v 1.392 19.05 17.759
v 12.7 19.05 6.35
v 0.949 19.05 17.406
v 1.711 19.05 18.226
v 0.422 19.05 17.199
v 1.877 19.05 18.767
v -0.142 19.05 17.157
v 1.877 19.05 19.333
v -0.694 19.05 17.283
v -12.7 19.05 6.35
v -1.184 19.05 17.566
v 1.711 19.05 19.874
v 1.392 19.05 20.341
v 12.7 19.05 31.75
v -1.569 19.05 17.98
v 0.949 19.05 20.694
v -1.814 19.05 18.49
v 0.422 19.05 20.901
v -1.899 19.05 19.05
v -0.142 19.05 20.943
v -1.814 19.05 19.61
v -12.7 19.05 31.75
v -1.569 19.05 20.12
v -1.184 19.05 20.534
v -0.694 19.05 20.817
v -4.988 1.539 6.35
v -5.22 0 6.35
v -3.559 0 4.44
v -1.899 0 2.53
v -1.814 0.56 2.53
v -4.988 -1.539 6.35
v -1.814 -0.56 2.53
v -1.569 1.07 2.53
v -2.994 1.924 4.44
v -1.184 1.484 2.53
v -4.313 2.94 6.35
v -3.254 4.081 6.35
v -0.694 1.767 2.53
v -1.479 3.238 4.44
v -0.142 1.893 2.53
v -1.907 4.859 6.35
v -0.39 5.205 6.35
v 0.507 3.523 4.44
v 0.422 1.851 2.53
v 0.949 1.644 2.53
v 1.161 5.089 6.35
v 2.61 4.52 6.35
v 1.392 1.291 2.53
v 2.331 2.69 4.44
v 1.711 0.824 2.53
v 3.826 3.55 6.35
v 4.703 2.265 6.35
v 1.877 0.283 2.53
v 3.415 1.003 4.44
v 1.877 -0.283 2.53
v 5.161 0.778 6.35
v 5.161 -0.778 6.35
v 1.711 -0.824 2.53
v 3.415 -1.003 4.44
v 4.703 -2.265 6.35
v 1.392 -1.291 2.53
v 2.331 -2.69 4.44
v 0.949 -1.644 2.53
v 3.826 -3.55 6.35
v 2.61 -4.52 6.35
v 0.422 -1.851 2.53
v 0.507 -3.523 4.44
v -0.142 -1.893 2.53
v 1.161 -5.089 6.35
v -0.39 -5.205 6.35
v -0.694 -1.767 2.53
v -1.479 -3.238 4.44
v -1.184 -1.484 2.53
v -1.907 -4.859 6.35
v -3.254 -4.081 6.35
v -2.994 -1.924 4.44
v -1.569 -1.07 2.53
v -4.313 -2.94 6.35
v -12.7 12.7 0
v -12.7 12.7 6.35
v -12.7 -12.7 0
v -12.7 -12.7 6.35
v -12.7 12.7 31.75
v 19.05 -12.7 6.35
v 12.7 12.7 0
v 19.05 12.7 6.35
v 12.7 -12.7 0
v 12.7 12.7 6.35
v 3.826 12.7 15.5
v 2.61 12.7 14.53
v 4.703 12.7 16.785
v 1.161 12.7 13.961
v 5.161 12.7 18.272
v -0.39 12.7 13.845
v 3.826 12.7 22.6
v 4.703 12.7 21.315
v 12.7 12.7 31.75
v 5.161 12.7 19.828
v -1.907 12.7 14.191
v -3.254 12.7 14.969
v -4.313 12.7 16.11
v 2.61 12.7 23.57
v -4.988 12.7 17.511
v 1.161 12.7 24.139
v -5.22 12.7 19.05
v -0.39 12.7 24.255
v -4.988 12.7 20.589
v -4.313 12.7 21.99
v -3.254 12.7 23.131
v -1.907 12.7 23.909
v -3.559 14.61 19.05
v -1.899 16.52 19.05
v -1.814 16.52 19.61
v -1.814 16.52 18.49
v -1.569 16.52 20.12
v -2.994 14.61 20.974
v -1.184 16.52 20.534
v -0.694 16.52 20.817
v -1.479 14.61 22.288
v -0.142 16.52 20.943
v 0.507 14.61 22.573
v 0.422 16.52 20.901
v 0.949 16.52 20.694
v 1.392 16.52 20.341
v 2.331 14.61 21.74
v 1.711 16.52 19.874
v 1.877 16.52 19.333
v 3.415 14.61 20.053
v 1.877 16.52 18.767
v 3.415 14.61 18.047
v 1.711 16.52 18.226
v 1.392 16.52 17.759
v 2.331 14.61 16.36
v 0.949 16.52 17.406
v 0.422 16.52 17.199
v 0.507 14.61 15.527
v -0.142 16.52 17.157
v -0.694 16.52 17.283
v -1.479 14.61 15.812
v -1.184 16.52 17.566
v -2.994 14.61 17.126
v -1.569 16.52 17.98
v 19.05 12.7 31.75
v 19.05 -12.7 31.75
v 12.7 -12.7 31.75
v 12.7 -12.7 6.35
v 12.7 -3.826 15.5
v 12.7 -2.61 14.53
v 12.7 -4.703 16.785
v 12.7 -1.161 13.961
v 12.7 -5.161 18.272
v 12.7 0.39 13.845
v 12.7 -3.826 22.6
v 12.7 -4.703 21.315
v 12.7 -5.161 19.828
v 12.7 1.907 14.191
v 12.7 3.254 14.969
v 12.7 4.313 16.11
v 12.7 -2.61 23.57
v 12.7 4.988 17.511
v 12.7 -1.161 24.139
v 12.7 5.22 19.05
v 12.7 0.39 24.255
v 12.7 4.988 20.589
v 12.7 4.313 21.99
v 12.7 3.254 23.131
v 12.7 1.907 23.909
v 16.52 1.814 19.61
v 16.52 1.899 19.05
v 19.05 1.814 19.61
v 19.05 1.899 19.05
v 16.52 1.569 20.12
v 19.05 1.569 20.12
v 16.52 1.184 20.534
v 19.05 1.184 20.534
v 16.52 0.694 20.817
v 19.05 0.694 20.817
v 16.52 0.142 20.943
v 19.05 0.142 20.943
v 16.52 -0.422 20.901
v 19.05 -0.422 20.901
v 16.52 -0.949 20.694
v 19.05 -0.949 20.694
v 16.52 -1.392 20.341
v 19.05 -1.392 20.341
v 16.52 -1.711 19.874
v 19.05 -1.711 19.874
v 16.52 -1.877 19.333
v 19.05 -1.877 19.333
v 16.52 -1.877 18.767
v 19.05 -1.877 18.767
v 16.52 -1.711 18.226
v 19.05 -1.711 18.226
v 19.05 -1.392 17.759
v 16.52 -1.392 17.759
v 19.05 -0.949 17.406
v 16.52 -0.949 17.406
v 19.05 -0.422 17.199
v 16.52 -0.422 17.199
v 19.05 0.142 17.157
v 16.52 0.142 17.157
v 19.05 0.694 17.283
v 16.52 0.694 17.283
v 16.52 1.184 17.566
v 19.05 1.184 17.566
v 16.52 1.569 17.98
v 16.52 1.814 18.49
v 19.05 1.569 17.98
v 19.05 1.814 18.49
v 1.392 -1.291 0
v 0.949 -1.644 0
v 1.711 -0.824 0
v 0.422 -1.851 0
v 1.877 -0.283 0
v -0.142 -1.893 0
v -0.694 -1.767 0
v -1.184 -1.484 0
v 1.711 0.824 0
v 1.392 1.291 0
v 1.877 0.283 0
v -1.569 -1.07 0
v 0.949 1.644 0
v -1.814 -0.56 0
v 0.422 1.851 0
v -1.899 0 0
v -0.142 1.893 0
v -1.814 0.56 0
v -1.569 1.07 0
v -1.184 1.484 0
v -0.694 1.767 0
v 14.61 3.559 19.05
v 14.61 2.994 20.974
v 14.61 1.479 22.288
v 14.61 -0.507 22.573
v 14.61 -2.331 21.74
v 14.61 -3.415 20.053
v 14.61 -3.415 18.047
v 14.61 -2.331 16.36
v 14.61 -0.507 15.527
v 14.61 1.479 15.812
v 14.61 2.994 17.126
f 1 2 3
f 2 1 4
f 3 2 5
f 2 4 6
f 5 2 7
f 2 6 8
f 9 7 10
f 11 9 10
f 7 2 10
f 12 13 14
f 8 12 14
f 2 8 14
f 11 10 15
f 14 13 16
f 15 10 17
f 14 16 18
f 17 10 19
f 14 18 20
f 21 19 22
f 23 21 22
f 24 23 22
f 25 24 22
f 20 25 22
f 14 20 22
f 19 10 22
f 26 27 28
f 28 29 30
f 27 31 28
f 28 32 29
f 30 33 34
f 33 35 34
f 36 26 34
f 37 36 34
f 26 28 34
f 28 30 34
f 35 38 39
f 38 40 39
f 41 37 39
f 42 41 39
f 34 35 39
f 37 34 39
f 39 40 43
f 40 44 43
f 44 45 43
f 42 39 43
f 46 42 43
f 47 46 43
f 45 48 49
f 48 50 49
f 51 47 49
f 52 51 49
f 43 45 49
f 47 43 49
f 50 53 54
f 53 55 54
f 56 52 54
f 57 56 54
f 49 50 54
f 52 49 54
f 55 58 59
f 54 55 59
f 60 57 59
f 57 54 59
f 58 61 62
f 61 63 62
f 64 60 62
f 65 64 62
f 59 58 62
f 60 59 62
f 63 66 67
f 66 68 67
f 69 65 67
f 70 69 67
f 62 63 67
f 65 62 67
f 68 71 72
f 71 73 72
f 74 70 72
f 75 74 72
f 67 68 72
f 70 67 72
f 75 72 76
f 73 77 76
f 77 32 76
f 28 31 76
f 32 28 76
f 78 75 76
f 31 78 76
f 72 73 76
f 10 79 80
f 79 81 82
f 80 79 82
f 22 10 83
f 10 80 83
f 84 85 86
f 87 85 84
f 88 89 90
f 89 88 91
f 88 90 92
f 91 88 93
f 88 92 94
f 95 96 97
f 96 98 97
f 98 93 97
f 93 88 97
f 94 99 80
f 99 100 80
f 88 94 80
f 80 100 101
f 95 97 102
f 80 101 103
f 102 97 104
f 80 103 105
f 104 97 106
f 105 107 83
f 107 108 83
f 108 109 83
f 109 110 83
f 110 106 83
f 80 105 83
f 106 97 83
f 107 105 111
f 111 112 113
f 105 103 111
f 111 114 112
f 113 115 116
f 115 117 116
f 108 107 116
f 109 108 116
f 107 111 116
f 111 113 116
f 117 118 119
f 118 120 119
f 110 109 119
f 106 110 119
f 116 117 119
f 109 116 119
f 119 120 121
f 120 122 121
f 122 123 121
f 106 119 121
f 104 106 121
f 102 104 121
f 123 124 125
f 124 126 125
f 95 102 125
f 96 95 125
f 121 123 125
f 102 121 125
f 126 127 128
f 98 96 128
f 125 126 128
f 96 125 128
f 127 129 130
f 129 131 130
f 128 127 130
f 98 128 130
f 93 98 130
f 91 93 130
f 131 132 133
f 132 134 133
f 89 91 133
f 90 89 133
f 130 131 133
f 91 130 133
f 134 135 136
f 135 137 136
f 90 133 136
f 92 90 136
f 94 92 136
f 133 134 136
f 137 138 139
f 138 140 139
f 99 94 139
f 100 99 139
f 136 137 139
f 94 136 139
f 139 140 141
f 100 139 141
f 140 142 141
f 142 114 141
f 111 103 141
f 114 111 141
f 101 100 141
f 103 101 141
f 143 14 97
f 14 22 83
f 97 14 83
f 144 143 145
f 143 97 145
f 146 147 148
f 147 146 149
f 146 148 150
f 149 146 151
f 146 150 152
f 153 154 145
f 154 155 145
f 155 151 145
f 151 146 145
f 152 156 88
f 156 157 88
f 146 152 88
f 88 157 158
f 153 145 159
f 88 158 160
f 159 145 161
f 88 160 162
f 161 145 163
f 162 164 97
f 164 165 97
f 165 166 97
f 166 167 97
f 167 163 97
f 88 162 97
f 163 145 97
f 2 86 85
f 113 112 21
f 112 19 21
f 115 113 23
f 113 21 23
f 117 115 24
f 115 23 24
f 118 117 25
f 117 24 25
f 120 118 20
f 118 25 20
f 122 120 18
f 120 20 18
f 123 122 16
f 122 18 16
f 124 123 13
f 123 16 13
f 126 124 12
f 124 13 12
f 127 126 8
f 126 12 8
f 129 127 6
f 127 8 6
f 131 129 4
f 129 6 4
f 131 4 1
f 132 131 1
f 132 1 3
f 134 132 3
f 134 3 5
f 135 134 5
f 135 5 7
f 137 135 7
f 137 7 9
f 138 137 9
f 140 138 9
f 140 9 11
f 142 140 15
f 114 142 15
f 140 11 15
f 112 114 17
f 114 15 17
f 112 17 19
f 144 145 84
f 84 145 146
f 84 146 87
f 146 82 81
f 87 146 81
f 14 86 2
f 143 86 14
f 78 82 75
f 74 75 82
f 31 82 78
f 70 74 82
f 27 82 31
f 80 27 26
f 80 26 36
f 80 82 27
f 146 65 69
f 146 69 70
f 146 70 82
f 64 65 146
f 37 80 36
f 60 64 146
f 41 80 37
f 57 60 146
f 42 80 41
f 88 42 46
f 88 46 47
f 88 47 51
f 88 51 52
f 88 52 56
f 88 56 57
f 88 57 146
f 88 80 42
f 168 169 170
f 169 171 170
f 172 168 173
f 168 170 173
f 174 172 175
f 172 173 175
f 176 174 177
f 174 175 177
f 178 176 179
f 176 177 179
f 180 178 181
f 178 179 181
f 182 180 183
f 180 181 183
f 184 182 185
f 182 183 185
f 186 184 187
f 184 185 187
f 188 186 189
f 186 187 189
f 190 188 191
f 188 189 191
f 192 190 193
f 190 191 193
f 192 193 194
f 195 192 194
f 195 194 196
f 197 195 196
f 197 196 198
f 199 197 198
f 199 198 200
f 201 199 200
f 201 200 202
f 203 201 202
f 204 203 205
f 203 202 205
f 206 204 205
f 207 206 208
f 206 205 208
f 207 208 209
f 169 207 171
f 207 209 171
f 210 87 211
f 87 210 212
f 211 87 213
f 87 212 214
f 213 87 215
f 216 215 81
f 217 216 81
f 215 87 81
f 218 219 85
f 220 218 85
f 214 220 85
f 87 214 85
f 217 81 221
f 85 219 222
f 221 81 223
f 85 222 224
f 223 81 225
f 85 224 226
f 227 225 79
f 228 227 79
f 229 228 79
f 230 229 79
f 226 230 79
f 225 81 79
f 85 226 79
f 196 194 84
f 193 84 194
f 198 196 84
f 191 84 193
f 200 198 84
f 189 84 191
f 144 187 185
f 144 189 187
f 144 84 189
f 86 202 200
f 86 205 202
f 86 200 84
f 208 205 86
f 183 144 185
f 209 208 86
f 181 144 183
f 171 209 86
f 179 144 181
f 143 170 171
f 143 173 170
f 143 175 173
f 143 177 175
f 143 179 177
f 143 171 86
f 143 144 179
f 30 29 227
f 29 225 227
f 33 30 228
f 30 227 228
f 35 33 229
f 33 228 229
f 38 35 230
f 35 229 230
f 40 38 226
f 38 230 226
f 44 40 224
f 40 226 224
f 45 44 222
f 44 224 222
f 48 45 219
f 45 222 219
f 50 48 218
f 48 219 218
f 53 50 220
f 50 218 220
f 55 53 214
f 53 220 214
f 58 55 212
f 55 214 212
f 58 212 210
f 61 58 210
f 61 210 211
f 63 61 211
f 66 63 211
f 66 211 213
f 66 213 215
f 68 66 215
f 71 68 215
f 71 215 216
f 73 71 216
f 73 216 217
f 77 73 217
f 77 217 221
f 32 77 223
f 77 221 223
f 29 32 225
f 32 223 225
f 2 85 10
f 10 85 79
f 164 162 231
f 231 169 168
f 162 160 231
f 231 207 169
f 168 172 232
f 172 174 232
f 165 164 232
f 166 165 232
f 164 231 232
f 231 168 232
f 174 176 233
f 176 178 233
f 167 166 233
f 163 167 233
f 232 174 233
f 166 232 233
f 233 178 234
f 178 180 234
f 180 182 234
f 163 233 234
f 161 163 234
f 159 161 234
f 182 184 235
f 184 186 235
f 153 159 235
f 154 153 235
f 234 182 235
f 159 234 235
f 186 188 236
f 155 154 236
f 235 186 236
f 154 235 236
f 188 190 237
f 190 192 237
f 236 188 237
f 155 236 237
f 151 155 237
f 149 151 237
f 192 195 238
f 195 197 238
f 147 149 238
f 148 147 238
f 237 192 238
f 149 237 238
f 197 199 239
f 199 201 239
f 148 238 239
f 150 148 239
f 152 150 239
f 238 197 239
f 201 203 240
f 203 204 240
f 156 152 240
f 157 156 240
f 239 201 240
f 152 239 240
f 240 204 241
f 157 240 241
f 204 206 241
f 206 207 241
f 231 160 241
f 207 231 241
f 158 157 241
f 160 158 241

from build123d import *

# Parameters (mm, degrees)
F0_W                 = 25.4
F0_H                 = 25.4
F1_DEPTH             = 6.35
F2_W                 = 25.4
F2_H                 = 6.35
F3_DEPTH             = 6.35
F4_W                 = 25.4
F4_H                 = 6.35
F5_DEPTH             = 6.35
F9_D                 = 3.7973
F9_CSINK_D           = 10.4394
F9_CSINK_ANGLE       = 82
F9_ON_F6_D           = 3.7973
F9_ON_F6_CSINK_D     = 10.4394
F9_ON_F6_CSINK_ANGLE = 82
F9_ON_F8_D           = 3.7973
F9_ON_F8_CSINK_D     = 10.4394
F9_ON_F8_CSINK_ANGLE = 82
F10_SIZE             = 6.35


with BuildPart() as f1:
    # F0 (on Top) → F1 (new body)
    with BuildSketch(Plane.XY):
        Rectangle(F0_W, F0_H)
    extrude(amount=F1_DEPTH)

    # F2 (on face) → F3 (join)
    with BuildSketch(Plane.YZ.offset(12.7)):
        Polygon((12.7, 6.35), (12.7, 0), (19.05, 0), (19.05, 31.75), (-12.7, 31.75), (-12.7, 6.35), align=None)
        with Locations((0, 3.175)):
            Rectangle(F2_W, F2_H)
    extrude(amount=F3_DEPTH)

    # F4 (on face) → F5 (join)
    with BuildSketch(Plane(origin=(0, 12.7, 0), x_dir=(-1, 0, 0), z_dir=(0, 1, 0))):
        Polygon((-19.05, 0), (-12.7, 0), (-12.7, 6.35), (12.7, 6.35), (12.7, 31.75), (-19.05, 31.75), align=None)
        with Locations((0, 3.175)):
            Rectangle(F4_W, F4_H)
    extrude(amount=F5_DEPTH)

    # F9 (through all)
    with Locations(Plane(origin=(12.7, 0, 0), x_dir=(0, -1, 0), z_dir=(-1, 0, 0))):
        with Locations((0, 19.05)):
            CounterSinkHole(F9_D / 2, F9_CSINK_D / 2, counter_sink_angle=F9_CSINK_ANGLE)

    # F9 on F6 (through all)
    with Locations(Plane.XY.offset(6.35)):
        with Locations((0, 0)):
            CounterSinkHole(F9_ON_F6_D / 2, F9_ON_F6_CSINK_D / 2, counter_sink_angle=F9_ON_F6_CSINK_ANGLE)

    # F9 on F8 (through all)
    with Locations(Plane.XZ.offset(-12.7)):
        with Locations((0, 19.05)):
            CounterSinkHole(F9_ON_F8_D / 2, F9_ON_F8_CSINK_D / 2, counter_sink_angle=F9_ON_F8_CSINK_ANGLE)

    # F10
    f10_edges = [f1.edges().sort_by_distance(p)[0] for p in [
        (19.05, 19.05, 15.875),
        (19.05, 3.175, 0),
        (3.175, 19.05, 0),
    ]]
    chamfer(f10_edges, length=F10_SIZE)


solid = f1.part
